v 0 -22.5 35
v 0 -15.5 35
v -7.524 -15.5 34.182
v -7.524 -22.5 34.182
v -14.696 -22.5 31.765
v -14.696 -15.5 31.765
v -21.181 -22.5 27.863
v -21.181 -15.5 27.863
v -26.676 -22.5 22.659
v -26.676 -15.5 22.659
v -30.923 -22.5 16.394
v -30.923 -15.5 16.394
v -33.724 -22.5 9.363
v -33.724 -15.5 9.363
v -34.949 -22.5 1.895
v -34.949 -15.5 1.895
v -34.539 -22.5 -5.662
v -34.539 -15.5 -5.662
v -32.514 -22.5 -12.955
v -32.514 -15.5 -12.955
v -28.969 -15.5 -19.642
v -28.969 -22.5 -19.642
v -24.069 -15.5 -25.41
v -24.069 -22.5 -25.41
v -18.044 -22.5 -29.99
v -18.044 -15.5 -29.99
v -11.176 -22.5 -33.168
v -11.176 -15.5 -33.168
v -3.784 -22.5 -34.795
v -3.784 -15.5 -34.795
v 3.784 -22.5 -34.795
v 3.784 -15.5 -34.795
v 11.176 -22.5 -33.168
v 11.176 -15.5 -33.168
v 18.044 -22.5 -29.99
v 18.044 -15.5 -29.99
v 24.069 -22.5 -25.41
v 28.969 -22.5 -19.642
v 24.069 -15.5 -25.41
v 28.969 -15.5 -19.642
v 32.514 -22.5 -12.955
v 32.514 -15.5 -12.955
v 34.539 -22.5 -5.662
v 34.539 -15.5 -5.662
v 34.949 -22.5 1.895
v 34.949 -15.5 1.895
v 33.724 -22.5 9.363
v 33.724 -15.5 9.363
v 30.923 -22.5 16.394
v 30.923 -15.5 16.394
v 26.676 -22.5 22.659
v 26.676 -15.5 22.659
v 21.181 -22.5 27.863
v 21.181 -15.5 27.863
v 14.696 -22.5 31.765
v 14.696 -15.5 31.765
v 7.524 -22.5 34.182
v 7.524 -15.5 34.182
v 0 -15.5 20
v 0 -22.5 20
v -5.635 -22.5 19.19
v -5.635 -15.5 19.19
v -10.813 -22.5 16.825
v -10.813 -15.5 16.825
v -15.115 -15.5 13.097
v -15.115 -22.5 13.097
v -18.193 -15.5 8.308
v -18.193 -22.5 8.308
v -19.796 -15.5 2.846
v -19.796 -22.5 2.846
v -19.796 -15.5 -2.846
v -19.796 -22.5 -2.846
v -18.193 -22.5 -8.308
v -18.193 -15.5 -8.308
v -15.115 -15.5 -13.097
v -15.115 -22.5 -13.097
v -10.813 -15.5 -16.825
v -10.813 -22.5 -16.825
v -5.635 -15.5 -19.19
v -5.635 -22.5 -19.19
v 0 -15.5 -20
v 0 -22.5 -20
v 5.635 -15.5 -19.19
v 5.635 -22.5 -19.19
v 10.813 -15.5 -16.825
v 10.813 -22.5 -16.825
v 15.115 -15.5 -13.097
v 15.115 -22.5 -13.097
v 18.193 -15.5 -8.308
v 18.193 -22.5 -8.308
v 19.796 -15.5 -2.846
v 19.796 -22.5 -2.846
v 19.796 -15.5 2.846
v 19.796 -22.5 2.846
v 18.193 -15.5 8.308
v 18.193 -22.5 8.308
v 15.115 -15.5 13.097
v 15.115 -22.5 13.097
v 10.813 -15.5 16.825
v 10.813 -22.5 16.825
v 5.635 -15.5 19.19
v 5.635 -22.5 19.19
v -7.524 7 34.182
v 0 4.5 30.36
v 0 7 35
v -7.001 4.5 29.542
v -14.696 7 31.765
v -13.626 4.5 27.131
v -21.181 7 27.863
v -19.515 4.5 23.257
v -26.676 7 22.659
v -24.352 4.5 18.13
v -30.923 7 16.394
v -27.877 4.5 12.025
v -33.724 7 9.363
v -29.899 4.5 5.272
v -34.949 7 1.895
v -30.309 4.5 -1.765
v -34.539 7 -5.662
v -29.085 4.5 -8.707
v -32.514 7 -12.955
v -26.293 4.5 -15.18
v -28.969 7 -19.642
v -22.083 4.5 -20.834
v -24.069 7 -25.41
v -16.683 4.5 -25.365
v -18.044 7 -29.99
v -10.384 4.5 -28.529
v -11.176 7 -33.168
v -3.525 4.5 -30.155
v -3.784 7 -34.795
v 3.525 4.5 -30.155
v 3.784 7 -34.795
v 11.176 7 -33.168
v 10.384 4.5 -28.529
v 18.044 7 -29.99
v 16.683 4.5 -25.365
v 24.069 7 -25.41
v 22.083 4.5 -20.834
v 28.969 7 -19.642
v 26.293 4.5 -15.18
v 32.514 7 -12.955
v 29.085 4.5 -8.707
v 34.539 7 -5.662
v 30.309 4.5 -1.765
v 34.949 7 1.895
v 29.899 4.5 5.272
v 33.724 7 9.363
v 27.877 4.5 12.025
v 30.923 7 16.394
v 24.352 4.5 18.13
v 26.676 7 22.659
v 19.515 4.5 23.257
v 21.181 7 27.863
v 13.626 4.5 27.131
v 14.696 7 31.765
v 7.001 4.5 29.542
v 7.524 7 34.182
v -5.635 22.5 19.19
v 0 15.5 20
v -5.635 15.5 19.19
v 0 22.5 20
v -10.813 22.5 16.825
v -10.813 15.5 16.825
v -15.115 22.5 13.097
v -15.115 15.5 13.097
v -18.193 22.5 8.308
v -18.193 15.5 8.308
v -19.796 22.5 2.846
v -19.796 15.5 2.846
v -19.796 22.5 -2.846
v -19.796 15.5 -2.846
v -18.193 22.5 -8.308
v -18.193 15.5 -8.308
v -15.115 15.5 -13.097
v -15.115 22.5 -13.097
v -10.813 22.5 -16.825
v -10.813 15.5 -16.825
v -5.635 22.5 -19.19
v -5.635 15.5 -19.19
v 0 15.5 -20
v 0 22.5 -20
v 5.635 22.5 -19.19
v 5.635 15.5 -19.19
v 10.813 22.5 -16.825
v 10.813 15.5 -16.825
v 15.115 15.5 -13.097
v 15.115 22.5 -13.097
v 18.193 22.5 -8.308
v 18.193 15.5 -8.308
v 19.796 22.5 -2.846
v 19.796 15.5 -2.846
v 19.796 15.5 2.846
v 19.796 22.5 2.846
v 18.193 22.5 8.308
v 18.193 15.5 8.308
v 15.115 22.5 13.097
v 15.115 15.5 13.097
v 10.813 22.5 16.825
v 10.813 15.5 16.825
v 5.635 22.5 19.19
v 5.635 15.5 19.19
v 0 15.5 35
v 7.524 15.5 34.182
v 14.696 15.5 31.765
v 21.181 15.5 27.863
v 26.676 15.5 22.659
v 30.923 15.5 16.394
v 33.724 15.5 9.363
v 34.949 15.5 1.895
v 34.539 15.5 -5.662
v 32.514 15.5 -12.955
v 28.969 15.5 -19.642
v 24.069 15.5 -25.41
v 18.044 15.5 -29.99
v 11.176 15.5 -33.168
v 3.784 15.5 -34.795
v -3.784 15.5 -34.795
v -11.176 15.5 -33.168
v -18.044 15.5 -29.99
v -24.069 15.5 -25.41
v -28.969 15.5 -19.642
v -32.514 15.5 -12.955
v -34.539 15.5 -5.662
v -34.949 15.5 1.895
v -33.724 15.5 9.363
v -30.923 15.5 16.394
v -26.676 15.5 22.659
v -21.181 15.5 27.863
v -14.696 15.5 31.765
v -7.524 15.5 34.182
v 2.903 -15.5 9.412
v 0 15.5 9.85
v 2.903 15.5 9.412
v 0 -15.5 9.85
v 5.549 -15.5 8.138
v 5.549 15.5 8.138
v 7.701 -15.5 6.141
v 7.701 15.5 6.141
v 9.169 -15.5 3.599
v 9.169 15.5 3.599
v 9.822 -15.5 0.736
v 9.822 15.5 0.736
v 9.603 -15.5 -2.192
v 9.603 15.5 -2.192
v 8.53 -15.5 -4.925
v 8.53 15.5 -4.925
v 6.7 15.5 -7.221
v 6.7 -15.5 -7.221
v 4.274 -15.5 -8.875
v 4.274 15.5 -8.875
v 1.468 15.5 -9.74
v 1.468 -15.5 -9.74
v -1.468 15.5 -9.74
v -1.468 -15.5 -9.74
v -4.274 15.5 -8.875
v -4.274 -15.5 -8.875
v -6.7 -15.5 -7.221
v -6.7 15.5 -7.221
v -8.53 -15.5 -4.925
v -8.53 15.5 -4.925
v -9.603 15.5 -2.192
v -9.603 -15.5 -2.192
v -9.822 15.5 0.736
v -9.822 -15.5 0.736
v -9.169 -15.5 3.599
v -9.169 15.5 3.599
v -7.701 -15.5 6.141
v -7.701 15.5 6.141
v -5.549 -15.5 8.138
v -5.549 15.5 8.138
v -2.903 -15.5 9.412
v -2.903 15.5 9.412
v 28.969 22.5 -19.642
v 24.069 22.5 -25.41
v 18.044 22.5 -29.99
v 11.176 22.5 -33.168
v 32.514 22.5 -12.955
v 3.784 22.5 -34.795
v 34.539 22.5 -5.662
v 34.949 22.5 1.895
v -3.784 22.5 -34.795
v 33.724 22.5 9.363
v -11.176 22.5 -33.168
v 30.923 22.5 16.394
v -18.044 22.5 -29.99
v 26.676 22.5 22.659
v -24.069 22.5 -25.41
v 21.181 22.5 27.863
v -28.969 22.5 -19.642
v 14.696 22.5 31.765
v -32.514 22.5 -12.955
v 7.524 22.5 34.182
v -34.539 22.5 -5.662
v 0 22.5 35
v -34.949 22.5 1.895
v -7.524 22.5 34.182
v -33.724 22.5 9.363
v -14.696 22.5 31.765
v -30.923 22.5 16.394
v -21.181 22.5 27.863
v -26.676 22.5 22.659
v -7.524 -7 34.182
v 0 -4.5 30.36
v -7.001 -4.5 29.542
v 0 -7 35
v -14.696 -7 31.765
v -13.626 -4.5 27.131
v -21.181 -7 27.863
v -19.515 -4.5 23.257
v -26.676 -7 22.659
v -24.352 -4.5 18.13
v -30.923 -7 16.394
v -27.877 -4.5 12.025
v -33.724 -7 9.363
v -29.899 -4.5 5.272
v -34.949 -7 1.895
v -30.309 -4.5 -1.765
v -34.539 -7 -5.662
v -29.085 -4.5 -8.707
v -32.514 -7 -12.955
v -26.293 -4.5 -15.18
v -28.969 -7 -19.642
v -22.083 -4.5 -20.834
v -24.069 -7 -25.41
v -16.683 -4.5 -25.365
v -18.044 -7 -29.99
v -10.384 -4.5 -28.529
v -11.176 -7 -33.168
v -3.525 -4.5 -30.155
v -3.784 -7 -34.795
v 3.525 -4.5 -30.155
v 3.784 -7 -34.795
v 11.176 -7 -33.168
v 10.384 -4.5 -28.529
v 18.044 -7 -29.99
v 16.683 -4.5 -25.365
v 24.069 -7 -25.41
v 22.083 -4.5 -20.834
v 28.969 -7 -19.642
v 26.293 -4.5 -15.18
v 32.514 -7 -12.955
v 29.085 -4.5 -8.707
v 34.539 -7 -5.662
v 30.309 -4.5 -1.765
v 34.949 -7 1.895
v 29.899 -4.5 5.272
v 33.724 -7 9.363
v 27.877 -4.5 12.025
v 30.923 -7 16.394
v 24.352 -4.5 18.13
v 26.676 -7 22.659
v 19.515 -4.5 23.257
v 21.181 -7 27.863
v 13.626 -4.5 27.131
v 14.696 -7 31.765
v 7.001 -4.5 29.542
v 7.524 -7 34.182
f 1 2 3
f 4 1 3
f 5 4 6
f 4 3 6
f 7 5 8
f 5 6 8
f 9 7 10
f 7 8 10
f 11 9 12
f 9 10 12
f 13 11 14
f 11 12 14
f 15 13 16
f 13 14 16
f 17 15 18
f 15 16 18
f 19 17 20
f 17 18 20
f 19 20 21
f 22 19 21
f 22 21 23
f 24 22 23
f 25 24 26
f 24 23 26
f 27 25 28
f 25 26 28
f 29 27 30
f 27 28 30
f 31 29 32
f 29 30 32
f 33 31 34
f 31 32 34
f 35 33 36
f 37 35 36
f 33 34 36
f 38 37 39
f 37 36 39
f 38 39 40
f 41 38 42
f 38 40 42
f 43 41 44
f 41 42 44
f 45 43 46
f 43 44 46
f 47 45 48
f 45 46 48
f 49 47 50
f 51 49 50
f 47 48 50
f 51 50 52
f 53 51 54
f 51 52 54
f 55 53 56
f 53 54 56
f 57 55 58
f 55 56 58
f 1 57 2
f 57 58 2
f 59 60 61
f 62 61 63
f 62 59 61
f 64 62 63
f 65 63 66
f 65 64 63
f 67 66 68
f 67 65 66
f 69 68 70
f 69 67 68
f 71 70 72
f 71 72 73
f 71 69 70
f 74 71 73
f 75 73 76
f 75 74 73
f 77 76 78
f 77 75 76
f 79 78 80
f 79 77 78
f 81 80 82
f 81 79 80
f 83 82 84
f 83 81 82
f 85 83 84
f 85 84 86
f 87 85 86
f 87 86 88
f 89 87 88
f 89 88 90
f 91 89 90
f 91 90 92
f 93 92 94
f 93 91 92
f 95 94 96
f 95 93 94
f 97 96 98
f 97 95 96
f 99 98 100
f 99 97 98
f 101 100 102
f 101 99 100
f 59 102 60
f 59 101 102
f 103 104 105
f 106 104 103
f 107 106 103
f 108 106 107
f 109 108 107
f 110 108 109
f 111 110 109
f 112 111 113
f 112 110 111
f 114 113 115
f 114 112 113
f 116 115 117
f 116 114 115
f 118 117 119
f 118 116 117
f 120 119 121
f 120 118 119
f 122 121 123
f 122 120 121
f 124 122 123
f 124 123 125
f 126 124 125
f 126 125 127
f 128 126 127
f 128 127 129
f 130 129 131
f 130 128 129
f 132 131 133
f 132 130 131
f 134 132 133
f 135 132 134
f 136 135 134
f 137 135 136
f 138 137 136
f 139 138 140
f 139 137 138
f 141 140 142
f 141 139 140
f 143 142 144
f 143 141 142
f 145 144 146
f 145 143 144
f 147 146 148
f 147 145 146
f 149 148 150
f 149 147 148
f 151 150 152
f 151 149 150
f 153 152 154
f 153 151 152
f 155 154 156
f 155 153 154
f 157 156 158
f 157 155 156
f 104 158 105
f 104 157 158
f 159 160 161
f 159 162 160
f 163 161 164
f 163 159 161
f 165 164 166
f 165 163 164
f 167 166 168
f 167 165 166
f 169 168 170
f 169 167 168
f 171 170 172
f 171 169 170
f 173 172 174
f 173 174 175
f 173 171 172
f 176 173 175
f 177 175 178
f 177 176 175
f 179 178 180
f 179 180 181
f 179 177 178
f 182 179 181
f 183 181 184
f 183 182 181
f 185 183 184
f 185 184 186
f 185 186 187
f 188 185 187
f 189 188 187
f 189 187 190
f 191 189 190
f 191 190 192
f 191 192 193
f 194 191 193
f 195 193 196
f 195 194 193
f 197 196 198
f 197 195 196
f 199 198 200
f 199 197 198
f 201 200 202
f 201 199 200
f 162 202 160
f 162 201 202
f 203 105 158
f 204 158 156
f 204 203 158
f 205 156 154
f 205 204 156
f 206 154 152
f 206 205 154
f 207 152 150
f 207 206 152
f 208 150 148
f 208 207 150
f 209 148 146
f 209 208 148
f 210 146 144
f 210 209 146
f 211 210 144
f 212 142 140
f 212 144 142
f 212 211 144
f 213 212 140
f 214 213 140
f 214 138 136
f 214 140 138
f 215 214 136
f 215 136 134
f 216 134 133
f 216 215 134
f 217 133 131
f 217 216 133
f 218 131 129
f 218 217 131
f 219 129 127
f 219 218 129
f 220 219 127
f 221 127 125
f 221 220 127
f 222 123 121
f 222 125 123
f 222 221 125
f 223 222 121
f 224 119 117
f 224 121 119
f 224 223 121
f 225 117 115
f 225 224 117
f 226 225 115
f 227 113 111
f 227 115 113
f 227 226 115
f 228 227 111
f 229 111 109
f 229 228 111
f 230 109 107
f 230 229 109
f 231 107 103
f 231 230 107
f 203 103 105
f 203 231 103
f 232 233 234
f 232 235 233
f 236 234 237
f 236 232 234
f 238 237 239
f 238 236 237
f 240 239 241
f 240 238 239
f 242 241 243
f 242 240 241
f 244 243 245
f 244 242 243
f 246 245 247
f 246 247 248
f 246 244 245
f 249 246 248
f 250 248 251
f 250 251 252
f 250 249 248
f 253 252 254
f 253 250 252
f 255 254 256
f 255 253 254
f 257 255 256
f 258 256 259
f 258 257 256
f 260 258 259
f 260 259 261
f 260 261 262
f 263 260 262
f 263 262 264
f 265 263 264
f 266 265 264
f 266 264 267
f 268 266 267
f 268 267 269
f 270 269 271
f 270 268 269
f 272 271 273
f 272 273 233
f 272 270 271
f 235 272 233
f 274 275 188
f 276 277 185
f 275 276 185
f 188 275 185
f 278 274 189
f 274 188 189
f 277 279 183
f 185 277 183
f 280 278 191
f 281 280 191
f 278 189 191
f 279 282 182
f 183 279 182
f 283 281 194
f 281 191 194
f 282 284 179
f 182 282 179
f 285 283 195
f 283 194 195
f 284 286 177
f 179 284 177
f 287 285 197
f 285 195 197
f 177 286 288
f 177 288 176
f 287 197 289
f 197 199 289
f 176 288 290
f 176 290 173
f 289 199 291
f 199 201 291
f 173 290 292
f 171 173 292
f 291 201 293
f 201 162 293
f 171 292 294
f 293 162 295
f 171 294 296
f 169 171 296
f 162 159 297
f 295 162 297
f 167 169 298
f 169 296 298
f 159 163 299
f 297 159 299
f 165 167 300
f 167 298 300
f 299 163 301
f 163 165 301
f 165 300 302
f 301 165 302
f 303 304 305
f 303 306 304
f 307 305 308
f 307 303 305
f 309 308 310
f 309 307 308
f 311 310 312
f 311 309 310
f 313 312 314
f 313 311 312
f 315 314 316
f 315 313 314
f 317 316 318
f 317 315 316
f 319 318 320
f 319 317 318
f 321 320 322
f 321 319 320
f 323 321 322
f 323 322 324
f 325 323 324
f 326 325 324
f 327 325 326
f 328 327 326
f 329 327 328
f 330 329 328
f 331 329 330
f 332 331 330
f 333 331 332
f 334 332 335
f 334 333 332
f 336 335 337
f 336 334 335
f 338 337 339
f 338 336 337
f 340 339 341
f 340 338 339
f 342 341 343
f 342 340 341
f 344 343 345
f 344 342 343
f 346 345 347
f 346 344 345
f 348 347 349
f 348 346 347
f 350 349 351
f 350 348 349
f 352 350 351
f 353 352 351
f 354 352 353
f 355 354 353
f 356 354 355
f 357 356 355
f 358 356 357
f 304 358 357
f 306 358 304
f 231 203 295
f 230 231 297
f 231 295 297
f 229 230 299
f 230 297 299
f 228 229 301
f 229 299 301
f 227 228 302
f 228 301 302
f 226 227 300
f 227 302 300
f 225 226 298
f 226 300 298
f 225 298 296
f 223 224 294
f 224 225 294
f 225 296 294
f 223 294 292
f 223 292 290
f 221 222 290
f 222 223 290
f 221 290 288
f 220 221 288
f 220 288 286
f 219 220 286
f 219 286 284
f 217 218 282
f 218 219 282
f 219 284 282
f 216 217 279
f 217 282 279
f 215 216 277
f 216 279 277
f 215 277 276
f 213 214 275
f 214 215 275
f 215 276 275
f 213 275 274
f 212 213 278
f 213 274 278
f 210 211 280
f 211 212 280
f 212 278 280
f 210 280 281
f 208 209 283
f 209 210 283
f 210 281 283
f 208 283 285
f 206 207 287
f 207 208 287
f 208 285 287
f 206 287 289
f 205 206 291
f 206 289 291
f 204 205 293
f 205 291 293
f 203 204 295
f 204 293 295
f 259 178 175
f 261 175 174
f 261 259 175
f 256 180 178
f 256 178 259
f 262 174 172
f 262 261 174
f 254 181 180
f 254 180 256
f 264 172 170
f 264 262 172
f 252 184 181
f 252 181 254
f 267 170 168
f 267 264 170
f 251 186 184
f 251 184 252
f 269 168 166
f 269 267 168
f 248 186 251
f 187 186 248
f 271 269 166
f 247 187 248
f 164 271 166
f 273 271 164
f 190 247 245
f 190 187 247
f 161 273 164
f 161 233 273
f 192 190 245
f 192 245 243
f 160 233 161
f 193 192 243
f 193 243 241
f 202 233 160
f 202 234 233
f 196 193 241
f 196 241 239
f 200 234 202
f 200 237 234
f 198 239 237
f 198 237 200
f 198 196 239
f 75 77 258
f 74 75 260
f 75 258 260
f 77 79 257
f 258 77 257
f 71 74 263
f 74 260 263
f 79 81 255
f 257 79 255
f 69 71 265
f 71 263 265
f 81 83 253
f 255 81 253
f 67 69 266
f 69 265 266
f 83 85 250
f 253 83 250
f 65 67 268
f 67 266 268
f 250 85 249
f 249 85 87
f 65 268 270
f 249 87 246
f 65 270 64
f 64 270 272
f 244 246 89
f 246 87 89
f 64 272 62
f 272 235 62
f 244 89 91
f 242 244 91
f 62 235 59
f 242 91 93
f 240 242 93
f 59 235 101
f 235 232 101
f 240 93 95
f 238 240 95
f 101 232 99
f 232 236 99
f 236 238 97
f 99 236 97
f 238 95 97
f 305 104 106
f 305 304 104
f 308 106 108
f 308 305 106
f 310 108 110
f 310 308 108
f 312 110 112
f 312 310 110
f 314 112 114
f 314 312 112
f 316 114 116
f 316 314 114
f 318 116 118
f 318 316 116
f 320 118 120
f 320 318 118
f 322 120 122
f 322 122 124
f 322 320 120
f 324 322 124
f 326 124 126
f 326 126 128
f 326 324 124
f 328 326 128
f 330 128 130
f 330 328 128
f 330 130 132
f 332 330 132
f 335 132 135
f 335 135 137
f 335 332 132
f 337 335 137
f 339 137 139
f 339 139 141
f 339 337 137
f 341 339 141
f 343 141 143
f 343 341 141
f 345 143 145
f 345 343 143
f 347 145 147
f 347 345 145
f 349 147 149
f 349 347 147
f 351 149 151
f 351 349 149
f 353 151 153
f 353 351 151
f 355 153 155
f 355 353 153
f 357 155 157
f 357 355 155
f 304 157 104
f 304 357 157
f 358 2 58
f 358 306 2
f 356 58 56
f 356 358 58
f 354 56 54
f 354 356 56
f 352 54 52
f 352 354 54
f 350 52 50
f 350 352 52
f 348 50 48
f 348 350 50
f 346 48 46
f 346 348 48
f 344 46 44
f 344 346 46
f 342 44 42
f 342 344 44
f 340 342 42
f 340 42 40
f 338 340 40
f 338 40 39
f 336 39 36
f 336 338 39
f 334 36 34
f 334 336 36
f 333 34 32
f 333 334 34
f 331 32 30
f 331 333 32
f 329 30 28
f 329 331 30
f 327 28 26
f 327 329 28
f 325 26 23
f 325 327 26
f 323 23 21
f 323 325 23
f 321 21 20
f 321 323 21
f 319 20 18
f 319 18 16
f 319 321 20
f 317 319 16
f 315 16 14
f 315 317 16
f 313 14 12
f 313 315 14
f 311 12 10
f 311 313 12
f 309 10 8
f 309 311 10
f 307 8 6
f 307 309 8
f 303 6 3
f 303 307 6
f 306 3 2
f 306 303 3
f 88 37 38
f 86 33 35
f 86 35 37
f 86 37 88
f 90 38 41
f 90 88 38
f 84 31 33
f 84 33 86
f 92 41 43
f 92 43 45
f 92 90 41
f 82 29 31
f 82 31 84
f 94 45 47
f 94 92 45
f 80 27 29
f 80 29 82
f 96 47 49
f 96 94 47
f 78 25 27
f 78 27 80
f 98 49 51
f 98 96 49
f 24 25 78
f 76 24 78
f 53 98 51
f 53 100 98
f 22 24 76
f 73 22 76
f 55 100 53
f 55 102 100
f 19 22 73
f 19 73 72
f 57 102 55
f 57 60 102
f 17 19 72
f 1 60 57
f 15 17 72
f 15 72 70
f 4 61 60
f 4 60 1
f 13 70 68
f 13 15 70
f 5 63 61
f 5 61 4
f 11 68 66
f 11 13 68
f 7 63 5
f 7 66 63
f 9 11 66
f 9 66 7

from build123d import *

# Parameters (mm, degrees)
CROQUIS1_R              = 35
CROQUIS1_R_2            = 9.85
SALIENTE_EXTRUIR1_DEPTH = 15.5
CROQUIS3_W              = 15
CROQUIS3_H              = 7


with BuildPart() as part:
    # Croquis1 → Saliente-Extruir1 (new, symmetric)
    with BuildSketch(Plane(origin=(0, 0, 0), x_dir=(1, 0, 0), z_dir=(0, 1, 0))):
        with Locations(Location((0, 0, 0), (0, 0, 270))):
            Circle(CROQUIS1_R)
        with Locations(Location((0, 0, 0), (0, 0, 270))):
            Circle(CROQUIS1_R_2, mode=Mode.SUBTRACT)
    extrude(amount=SALIENTE_EXTRUIR1_DEPTH, both=True)

    # Croquis2 → Cortar-Revolución1 (revolve, cut)
    with BuildSketch(Plane(origin=(0, 0, 0), x_dir=(0, 0, -1), z_dir=(1, 0, 0))):
        Polygon((-30.36, -4.5), (-35, -7), (-35, 7), (-30.36, 4.5), align=None)
    revolve(axis=Axis((0, 15.5, 0), (0, -1, 0)), mode=Mode.SUBTRACT)

    # Croquis3 → Revolución1 (revolve)
    with BuildSketch(Plane(origin=(0, 0, 0), x_dir=(0, 0, -1), z_dir=(1, 0, 0))):
        with Locations((-27.5, 19)):
            Rectangle(CROQUIS3_W, CROQUIS3_H)
        with Locations((-27.5, -19)):
            Rectangle(CROQUIS3_W, CROQUIS3_H)
    revolve(axis=Axis((0, 15.5, 0), (0, -1, 0)))


solid = part.part
